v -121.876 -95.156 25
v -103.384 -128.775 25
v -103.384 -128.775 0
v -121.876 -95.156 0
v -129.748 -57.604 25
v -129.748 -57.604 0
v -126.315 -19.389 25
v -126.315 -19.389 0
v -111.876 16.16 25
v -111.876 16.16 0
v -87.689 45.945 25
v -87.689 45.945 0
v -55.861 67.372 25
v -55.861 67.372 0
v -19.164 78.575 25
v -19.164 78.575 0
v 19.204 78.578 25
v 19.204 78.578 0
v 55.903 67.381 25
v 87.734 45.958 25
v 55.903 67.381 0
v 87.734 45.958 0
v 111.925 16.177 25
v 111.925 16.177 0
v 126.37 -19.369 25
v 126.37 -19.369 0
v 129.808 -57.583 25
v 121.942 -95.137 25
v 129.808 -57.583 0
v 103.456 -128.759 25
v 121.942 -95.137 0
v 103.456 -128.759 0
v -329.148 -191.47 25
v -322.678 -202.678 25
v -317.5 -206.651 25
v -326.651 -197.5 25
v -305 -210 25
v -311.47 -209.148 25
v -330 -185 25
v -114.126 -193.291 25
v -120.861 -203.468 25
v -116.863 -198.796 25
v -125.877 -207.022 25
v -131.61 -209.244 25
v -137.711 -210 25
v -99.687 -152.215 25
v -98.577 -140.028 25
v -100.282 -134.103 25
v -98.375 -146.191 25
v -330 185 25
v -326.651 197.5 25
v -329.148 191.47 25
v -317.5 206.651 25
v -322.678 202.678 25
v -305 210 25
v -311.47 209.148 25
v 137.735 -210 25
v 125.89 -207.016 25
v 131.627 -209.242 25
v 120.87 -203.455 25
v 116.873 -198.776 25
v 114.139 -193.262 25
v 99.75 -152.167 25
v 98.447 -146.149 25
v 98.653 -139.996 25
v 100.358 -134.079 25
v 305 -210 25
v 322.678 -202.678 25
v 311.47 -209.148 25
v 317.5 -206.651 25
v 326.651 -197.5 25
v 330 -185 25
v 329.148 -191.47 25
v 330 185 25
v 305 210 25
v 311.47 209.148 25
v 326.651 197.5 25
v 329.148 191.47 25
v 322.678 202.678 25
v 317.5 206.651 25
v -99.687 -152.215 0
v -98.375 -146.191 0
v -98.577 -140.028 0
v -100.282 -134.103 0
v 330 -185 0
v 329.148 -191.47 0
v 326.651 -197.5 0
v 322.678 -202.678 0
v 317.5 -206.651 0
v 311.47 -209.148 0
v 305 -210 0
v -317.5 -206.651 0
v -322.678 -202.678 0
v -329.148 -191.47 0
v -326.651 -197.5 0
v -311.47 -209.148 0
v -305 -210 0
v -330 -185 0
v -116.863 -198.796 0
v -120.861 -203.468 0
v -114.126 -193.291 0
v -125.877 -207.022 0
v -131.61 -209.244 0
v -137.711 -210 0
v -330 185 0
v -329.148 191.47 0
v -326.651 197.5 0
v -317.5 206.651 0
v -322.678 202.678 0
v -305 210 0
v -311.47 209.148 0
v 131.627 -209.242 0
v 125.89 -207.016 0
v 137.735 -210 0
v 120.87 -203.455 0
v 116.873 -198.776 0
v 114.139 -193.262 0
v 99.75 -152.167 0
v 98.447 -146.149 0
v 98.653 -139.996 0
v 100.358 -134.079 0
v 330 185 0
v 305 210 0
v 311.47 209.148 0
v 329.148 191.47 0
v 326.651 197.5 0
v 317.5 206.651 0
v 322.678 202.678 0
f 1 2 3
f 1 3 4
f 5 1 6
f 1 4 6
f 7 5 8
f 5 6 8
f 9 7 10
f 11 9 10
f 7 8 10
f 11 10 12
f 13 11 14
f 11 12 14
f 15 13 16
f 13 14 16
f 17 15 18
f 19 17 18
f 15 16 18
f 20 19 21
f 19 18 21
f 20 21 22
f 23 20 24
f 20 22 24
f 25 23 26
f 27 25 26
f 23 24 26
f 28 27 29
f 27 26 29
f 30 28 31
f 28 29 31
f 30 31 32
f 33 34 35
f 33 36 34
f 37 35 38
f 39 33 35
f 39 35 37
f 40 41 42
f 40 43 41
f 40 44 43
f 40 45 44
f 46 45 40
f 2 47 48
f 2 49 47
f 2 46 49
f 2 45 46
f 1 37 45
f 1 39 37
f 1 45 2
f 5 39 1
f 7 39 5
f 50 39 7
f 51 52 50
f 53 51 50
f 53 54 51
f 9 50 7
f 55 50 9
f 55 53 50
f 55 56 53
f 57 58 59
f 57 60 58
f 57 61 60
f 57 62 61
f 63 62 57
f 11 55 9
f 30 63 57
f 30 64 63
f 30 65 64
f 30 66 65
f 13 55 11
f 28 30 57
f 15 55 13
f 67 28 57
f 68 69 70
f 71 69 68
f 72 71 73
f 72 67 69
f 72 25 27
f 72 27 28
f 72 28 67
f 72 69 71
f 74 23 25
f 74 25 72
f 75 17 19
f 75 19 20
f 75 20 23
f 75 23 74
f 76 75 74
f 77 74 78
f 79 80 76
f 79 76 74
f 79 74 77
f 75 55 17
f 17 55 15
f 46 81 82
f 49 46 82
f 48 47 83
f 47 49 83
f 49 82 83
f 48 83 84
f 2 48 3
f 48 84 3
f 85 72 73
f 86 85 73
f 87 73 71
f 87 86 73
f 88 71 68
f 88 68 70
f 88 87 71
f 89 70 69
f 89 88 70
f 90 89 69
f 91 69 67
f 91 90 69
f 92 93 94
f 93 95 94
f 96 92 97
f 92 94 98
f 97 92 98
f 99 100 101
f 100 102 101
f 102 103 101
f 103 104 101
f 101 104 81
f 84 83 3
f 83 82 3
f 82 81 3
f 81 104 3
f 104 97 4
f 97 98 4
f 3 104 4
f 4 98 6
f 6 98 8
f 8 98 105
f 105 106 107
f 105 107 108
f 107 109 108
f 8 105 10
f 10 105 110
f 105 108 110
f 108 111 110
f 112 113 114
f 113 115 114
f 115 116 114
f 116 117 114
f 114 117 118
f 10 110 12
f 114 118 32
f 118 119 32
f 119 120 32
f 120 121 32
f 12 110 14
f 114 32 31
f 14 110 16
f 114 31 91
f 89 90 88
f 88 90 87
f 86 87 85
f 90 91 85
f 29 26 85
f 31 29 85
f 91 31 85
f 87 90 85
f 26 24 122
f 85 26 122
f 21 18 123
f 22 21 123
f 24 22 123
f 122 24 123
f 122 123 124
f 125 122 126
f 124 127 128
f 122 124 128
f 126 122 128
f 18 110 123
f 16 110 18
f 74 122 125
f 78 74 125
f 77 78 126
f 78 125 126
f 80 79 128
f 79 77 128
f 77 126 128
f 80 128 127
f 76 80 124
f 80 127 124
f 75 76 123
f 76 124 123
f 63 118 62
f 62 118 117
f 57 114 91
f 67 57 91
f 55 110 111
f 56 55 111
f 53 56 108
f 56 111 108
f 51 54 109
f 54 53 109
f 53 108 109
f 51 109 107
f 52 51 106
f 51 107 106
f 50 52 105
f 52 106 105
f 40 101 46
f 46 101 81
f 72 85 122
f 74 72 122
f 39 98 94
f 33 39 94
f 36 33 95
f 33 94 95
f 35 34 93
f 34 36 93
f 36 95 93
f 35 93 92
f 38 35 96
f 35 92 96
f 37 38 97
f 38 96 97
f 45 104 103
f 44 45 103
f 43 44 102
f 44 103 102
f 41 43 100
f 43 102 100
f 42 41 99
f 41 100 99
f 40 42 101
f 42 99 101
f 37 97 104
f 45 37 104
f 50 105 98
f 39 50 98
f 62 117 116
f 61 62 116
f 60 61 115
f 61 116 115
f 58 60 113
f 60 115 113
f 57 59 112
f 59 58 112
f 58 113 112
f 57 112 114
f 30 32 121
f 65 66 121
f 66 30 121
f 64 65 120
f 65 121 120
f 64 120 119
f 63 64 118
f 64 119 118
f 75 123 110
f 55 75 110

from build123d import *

# Parameters (mm, degrees)
F1_DEPTH    = 25
F2_T1_DEPTH = 150
F2_T3_DEPTH = 113.556925296
F2_T5_DEPTH = 96.327528549
F2_T7_DEPTH = 96.2047902339
F2_T9_DEPTH = 113.6738307778


# Not quite as in the source:
# - a fillet or chamfer that OpenCascade refuses, or shapes differently, is made with other operations: its cross-section is extruded or revolved along the edge and cut away or added


with BuildPart() as f1:
    # F0 (on Top) → F1 (new body)
    with BuildSketch(Plane.XY):
        with BuildLine():
            Line((330, -210), (330, 210))
            Line((330, 210), (-330, 210))
            Line((-330, 210), (-330, -210))
            Line((-330, -210), (-120, -210))
            Line((-120, -210), (-94.9556464673, -138.7567549117))
            ThreePointArc((-94.9556464673, -138.7567549117), (-47.6770453611, 70.9299598508), (130.0298179868, -50))
            ThreePointArc((130.0298179868, -50), (120.9675904588, -97.6870547372), (95.0443535327, -138.7256334719))
            Line((95.0443535327, -138.7256334719), (120, -210))
            Line((120, -210), (330, -210))
        make_face()
    extrude(amount=F1_DEPTH)

    # F2: fillet of radius 25 on 9 edges, made by hand

    # F2_s2 → F2_t1 (cut)
    with BuildSketch(Plane.XY.offset(-62.5)):
        with BuildLine():
            ThreePointArc((330, -185), (322.6776695297, -202.6776695297), (305, -210))
            Line((305, -210), (330, -210))
            Line((330, -210), (330, -185))
        make_face()
        with BuildLine():
            ThreePointArc((-330, -185), (-322.6776695297, -202.6776695297), (-305, -210))
            Line((-305, -210), (-330, -210))
            Line((-330, -210), (-330, -185))
        make_face()
        with BuildLine():
            ThreePointArc((330, 185), (322.6776695297, 202.6776695297), (305, 210))
            Line((305, 210), (330, 210))
            Line((330, 210), (330, 185))
        make_face()
        with BuildLine():
            ThreePointArc((-305, 210), (-322.6776695297, 202.6776695297), (-330, 185))
            Line((-330, 185), (-330, 210))
            Line((-330, 210), (-305, 210))
        make_face()
    extrude(amount=F2_T1_DEPTH, mode=Mode.SUBTRACT)

    # F2_s4 → F2_t3 (cut)
    with BuildSketch(Plane.XY.offset(-44.278462648)):
        with BuildLine():
            ThreePointArc((-137.7113850592, -210), (-123.2592934135, -205.3994374203), (-114.1262219297, -193.2909637652))
            Line((-114.1262219297, -193.2909637652), (-120, -210))
            Line((-120, -210), (-137.7113850592, -210))
        make_face()
    extrude(amount=F2_T3_DEPTH, mode=Mode.SUBTRACT)

    # F2_s6 → F2_t5 (cut)
    with BuildSketch(Plane.XY.offset(-35.6637642745)):
        with BuildLine():
            ThreePointArc((-99.6866381045, -152.2149260833), (-98.5772005252, -140.0282344234), (-103.3844432952, -128.7749361378))
            ThreePointArc((-103.3844432952, -128.7749361378), (-99.2955159897, -133.8717952023), (-94.9556464673, -138.7567549117))
            Line((-94.9556464673, -138.7567549117), (-99.6866381045, -152.2149260833))
        make_face()
    extrude(amount=F2_T5_DEPTH, mode=Mode.SUBTRACT)

    # F2_s8 → F2_t7 (cut)
    with BuildSketch(Plane.XY.offset(-35.6023951169)):
        with BuildLine():
            ThreePointArc((103.4562444176, -128.7589633994), (98.6534687448, -139.9957269325), (99.7504758881, -152.1665150823))
            Line((99.7504758881, -152.1665150823), (95.0443535327, -138.7256334719))
            ThreePointArc((95.0443535327, -138.7256334719), (99.3753638137, -133.8478534272), (103.4562444176, -128.7589633994))
        make_face()
    extrude(amount=F2_T7_DEPTH, mode=Mode.SUBTRACT)

    # F2_s10 → F2_t9 (cut)
    with BuildSketch(Plane.XY.offset(-44.3369153889)):
        with BuildLine():
            ThreePointArc((114.1393002355, -193.261597183), (123.2699801146, -205.3904380725), (137.7347661556, -210))
            Line((137.7347661556, -210), (120, -210))
            Line((120, -210), (114.1393002355, -193.261597183))
        make_face()
    extrude(amount=F2_T9_DEPTH, mode=Mode.SUBTRACT)


solid = f1.part
